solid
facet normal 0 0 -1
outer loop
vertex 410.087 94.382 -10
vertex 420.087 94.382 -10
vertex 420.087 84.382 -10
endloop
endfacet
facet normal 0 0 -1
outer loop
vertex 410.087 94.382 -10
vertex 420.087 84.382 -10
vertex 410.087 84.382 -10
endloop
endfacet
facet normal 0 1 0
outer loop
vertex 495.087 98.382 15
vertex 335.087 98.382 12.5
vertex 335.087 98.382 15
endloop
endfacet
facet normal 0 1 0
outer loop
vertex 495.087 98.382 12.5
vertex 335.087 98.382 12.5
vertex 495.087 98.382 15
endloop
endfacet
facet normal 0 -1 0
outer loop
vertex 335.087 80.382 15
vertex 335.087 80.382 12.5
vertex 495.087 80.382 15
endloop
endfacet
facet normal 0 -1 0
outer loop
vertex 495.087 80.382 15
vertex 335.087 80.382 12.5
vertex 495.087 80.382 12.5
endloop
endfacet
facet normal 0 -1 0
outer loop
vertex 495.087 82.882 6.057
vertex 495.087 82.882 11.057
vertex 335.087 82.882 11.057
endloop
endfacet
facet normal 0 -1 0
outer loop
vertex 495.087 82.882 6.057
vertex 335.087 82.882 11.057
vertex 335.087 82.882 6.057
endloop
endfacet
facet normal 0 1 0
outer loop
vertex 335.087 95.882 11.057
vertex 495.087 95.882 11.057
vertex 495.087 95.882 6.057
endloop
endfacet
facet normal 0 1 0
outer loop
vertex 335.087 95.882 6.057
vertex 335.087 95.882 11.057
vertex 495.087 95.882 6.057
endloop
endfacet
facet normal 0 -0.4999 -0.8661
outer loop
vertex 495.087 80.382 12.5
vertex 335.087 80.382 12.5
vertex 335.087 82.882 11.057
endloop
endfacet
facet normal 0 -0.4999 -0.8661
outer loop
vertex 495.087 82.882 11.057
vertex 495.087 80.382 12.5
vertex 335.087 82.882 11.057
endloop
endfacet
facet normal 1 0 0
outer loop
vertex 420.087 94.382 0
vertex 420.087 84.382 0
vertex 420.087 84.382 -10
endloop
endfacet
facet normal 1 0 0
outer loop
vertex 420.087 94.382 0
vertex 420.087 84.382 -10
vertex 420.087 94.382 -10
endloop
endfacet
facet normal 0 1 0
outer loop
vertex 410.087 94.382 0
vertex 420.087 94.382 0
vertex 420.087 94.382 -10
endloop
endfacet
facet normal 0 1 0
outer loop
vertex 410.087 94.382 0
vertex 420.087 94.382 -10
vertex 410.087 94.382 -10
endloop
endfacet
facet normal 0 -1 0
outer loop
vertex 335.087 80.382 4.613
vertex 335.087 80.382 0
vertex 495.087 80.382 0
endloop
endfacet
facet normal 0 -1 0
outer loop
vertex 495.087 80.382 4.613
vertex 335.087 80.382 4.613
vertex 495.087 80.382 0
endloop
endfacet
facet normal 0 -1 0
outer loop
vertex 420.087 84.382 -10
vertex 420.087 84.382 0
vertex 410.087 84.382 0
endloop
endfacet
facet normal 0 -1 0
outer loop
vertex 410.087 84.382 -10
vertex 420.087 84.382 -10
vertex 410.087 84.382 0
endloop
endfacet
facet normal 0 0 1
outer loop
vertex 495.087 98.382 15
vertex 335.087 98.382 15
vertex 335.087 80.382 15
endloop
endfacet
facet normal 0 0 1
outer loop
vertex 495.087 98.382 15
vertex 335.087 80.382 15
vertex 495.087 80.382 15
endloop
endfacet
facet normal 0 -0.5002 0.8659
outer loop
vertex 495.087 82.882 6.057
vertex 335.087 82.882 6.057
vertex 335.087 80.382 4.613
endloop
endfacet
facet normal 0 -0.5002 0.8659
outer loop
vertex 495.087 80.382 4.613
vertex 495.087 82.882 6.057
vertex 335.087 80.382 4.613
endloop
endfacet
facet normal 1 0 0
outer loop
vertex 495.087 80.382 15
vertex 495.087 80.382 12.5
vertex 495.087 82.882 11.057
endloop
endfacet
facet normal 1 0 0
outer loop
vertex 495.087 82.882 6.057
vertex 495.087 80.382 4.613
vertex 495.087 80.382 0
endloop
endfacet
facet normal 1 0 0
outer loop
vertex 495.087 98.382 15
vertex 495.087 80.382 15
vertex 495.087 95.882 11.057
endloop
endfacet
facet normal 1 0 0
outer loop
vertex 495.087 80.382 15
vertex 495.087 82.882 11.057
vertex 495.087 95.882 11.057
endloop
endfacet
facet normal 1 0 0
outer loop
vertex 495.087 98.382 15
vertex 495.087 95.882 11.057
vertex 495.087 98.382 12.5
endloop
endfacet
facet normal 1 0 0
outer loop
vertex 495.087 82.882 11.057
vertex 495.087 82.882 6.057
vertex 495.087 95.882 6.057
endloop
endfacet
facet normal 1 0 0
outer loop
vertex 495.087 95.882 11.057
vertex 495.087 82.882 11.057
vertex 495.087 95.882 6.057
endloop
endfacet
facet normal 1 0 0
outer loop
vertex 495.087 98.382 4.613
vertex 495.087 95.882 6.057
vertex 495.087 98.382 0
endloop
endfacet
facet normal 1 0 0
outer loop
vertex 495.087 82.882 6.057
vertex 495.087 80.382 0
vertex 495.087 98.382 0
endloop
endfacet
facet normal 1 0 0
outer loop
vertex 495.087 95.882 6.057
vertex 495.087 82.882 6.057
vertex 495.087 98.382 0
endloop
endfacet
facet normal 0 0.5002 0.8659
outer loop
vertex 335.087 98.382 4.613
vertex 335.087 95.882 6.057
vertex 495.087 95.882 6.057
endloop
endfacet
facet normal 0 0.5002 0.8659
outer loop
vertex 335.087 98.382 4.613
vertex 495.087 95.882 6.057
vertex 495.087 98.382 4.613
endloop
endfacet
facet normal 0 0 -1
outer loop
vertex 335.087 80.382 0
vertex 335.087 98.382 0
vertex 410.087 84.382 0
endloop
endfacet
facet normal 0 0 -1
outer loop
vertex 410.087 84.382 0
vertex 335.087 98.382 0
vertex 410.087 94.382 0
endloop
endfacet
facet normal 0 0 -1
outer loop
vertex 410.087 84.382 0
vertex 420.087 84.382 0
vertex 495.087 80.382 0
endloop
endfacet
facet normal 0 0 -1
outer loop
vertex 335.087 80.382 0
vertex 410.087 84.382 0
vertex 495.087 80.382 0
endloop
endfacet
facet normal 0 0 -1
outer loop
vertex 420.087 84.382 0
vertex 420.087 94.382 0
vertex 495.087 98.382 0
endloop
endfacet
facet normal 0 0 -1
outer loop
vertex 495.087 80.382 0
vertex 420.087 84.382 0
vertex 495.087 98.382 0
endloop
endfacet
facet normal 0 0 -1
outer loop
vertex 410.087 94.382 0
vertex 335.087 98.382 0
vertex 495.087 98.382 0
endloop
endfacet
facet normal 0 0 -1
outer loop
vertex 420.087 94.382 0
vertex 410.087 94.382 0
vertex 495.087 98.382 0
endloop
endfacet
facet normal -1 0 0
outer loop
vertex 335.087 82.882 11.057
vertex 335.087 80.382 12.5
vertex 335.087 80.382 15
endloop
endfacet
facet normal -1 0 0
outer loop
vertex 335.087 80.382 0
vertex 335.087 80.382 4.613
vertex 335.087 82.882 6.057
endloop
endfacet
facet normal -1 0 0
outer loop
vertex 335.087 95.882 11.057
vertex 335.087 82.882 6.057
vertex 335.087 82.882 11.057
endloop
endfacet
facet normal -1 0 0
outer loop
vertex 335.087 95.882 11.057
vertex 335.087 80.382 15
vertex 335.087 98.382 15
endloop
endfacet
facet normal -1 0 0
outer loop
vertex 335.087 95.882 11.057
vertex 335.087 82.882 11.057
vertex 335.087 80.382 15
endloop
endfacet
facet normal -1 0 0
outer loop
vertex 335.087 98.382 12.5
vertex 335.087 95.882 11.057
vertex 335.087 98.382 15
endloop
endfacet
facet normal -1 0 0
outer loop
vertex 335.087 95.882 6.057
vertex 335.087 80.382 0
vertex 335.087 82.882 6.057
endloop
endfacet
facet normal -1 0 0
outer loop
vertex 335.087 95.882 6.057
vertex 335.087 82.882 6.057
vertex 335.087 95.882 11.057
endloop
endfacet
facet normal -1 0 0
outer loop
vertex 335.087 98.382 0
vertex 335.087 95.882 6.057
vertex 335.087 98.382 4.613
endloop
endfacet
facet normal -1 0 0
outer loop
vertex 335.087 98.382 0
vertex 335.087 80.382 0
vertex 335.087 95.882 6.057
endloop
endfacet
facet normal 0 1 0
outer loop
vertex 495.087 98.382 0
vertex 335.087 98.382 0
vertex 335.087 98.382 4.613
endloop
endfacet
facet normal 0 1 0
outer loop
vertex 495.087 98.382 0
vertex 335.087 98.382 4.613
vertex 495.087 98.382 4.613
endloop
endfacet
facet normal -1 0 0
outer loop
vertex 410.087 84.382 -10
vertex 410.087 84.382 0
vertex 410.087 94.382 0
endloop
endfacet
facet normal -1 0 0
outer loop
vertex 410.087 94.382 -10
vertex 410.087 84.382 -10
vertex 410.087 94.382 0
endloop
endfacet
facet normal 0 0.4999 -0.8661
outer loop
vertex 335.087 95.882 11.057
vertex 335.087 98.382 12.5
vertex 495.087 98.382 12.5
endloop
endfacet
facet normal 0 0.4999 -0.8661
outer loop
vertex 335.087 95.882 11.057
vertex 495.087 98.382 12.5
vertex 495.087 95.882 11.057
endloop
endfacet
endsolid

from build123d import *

# Parameters (mm, degrees)
SKETCH1_W           = 160
SKETCH1_H           = 18
BOSS_EXTRUDE1_DEPTH = 15
CUT_EXTRUDE1_DEPTH  = 161
SKETCH3_W           = 10
SKETCH3_H           = 10
BOSS_EXTRUDE2_DEPTH = 10


with BuildPart() as part:
    # Sketch1 → Boss-Extrude1 (new body)
    with BuildSketch(Plane.XY):
        with Locations((415.087037167, 89.382420628)):
            Rectangle(SKETCH1_W, SKETCH1_H)
    extrude(amount=BOSS_EXTRUDE1_DEPTH)

    # Sketch2 → Cut-Extrude1 (cut, through all)
    with BuildSketch(Plane(origin=(495.087037167, 0, 0), x_dir=(0, 0, -1), z_dir=(1, 0, 0))):
        Polygon((-12.5, 98.382420628), (-11.056624327, 95.882420628), (-6.056624327, 95.882420628), (-4.613248654, 98.382420628), align=None)
        Polygon((-4.613248654, 80.382420628), (-12.5, 80.382420628), (-11.056624327, 82.882420628), (-6.056624327, 82.882420628), align=None)
    extrude(amount=-CUT_EXTRUDE1_DEPTH, mode=Mode.SUBTRACT)

    # Sketch3 → Boss-Extrude2 (add)
    with BuildSketch(Plane(origin=(0, 0, 0), x_dir=(-1, 0, 0), z_dir=(0, 0, -1))):
        with Locations((-415.087037167, 89.382420628)):
            Rectangle(SKETCH3_W, SKETCH3_H)
    extrude(amount=BOSS_EXTRUDE2_DEPTH)


solid = part.part
